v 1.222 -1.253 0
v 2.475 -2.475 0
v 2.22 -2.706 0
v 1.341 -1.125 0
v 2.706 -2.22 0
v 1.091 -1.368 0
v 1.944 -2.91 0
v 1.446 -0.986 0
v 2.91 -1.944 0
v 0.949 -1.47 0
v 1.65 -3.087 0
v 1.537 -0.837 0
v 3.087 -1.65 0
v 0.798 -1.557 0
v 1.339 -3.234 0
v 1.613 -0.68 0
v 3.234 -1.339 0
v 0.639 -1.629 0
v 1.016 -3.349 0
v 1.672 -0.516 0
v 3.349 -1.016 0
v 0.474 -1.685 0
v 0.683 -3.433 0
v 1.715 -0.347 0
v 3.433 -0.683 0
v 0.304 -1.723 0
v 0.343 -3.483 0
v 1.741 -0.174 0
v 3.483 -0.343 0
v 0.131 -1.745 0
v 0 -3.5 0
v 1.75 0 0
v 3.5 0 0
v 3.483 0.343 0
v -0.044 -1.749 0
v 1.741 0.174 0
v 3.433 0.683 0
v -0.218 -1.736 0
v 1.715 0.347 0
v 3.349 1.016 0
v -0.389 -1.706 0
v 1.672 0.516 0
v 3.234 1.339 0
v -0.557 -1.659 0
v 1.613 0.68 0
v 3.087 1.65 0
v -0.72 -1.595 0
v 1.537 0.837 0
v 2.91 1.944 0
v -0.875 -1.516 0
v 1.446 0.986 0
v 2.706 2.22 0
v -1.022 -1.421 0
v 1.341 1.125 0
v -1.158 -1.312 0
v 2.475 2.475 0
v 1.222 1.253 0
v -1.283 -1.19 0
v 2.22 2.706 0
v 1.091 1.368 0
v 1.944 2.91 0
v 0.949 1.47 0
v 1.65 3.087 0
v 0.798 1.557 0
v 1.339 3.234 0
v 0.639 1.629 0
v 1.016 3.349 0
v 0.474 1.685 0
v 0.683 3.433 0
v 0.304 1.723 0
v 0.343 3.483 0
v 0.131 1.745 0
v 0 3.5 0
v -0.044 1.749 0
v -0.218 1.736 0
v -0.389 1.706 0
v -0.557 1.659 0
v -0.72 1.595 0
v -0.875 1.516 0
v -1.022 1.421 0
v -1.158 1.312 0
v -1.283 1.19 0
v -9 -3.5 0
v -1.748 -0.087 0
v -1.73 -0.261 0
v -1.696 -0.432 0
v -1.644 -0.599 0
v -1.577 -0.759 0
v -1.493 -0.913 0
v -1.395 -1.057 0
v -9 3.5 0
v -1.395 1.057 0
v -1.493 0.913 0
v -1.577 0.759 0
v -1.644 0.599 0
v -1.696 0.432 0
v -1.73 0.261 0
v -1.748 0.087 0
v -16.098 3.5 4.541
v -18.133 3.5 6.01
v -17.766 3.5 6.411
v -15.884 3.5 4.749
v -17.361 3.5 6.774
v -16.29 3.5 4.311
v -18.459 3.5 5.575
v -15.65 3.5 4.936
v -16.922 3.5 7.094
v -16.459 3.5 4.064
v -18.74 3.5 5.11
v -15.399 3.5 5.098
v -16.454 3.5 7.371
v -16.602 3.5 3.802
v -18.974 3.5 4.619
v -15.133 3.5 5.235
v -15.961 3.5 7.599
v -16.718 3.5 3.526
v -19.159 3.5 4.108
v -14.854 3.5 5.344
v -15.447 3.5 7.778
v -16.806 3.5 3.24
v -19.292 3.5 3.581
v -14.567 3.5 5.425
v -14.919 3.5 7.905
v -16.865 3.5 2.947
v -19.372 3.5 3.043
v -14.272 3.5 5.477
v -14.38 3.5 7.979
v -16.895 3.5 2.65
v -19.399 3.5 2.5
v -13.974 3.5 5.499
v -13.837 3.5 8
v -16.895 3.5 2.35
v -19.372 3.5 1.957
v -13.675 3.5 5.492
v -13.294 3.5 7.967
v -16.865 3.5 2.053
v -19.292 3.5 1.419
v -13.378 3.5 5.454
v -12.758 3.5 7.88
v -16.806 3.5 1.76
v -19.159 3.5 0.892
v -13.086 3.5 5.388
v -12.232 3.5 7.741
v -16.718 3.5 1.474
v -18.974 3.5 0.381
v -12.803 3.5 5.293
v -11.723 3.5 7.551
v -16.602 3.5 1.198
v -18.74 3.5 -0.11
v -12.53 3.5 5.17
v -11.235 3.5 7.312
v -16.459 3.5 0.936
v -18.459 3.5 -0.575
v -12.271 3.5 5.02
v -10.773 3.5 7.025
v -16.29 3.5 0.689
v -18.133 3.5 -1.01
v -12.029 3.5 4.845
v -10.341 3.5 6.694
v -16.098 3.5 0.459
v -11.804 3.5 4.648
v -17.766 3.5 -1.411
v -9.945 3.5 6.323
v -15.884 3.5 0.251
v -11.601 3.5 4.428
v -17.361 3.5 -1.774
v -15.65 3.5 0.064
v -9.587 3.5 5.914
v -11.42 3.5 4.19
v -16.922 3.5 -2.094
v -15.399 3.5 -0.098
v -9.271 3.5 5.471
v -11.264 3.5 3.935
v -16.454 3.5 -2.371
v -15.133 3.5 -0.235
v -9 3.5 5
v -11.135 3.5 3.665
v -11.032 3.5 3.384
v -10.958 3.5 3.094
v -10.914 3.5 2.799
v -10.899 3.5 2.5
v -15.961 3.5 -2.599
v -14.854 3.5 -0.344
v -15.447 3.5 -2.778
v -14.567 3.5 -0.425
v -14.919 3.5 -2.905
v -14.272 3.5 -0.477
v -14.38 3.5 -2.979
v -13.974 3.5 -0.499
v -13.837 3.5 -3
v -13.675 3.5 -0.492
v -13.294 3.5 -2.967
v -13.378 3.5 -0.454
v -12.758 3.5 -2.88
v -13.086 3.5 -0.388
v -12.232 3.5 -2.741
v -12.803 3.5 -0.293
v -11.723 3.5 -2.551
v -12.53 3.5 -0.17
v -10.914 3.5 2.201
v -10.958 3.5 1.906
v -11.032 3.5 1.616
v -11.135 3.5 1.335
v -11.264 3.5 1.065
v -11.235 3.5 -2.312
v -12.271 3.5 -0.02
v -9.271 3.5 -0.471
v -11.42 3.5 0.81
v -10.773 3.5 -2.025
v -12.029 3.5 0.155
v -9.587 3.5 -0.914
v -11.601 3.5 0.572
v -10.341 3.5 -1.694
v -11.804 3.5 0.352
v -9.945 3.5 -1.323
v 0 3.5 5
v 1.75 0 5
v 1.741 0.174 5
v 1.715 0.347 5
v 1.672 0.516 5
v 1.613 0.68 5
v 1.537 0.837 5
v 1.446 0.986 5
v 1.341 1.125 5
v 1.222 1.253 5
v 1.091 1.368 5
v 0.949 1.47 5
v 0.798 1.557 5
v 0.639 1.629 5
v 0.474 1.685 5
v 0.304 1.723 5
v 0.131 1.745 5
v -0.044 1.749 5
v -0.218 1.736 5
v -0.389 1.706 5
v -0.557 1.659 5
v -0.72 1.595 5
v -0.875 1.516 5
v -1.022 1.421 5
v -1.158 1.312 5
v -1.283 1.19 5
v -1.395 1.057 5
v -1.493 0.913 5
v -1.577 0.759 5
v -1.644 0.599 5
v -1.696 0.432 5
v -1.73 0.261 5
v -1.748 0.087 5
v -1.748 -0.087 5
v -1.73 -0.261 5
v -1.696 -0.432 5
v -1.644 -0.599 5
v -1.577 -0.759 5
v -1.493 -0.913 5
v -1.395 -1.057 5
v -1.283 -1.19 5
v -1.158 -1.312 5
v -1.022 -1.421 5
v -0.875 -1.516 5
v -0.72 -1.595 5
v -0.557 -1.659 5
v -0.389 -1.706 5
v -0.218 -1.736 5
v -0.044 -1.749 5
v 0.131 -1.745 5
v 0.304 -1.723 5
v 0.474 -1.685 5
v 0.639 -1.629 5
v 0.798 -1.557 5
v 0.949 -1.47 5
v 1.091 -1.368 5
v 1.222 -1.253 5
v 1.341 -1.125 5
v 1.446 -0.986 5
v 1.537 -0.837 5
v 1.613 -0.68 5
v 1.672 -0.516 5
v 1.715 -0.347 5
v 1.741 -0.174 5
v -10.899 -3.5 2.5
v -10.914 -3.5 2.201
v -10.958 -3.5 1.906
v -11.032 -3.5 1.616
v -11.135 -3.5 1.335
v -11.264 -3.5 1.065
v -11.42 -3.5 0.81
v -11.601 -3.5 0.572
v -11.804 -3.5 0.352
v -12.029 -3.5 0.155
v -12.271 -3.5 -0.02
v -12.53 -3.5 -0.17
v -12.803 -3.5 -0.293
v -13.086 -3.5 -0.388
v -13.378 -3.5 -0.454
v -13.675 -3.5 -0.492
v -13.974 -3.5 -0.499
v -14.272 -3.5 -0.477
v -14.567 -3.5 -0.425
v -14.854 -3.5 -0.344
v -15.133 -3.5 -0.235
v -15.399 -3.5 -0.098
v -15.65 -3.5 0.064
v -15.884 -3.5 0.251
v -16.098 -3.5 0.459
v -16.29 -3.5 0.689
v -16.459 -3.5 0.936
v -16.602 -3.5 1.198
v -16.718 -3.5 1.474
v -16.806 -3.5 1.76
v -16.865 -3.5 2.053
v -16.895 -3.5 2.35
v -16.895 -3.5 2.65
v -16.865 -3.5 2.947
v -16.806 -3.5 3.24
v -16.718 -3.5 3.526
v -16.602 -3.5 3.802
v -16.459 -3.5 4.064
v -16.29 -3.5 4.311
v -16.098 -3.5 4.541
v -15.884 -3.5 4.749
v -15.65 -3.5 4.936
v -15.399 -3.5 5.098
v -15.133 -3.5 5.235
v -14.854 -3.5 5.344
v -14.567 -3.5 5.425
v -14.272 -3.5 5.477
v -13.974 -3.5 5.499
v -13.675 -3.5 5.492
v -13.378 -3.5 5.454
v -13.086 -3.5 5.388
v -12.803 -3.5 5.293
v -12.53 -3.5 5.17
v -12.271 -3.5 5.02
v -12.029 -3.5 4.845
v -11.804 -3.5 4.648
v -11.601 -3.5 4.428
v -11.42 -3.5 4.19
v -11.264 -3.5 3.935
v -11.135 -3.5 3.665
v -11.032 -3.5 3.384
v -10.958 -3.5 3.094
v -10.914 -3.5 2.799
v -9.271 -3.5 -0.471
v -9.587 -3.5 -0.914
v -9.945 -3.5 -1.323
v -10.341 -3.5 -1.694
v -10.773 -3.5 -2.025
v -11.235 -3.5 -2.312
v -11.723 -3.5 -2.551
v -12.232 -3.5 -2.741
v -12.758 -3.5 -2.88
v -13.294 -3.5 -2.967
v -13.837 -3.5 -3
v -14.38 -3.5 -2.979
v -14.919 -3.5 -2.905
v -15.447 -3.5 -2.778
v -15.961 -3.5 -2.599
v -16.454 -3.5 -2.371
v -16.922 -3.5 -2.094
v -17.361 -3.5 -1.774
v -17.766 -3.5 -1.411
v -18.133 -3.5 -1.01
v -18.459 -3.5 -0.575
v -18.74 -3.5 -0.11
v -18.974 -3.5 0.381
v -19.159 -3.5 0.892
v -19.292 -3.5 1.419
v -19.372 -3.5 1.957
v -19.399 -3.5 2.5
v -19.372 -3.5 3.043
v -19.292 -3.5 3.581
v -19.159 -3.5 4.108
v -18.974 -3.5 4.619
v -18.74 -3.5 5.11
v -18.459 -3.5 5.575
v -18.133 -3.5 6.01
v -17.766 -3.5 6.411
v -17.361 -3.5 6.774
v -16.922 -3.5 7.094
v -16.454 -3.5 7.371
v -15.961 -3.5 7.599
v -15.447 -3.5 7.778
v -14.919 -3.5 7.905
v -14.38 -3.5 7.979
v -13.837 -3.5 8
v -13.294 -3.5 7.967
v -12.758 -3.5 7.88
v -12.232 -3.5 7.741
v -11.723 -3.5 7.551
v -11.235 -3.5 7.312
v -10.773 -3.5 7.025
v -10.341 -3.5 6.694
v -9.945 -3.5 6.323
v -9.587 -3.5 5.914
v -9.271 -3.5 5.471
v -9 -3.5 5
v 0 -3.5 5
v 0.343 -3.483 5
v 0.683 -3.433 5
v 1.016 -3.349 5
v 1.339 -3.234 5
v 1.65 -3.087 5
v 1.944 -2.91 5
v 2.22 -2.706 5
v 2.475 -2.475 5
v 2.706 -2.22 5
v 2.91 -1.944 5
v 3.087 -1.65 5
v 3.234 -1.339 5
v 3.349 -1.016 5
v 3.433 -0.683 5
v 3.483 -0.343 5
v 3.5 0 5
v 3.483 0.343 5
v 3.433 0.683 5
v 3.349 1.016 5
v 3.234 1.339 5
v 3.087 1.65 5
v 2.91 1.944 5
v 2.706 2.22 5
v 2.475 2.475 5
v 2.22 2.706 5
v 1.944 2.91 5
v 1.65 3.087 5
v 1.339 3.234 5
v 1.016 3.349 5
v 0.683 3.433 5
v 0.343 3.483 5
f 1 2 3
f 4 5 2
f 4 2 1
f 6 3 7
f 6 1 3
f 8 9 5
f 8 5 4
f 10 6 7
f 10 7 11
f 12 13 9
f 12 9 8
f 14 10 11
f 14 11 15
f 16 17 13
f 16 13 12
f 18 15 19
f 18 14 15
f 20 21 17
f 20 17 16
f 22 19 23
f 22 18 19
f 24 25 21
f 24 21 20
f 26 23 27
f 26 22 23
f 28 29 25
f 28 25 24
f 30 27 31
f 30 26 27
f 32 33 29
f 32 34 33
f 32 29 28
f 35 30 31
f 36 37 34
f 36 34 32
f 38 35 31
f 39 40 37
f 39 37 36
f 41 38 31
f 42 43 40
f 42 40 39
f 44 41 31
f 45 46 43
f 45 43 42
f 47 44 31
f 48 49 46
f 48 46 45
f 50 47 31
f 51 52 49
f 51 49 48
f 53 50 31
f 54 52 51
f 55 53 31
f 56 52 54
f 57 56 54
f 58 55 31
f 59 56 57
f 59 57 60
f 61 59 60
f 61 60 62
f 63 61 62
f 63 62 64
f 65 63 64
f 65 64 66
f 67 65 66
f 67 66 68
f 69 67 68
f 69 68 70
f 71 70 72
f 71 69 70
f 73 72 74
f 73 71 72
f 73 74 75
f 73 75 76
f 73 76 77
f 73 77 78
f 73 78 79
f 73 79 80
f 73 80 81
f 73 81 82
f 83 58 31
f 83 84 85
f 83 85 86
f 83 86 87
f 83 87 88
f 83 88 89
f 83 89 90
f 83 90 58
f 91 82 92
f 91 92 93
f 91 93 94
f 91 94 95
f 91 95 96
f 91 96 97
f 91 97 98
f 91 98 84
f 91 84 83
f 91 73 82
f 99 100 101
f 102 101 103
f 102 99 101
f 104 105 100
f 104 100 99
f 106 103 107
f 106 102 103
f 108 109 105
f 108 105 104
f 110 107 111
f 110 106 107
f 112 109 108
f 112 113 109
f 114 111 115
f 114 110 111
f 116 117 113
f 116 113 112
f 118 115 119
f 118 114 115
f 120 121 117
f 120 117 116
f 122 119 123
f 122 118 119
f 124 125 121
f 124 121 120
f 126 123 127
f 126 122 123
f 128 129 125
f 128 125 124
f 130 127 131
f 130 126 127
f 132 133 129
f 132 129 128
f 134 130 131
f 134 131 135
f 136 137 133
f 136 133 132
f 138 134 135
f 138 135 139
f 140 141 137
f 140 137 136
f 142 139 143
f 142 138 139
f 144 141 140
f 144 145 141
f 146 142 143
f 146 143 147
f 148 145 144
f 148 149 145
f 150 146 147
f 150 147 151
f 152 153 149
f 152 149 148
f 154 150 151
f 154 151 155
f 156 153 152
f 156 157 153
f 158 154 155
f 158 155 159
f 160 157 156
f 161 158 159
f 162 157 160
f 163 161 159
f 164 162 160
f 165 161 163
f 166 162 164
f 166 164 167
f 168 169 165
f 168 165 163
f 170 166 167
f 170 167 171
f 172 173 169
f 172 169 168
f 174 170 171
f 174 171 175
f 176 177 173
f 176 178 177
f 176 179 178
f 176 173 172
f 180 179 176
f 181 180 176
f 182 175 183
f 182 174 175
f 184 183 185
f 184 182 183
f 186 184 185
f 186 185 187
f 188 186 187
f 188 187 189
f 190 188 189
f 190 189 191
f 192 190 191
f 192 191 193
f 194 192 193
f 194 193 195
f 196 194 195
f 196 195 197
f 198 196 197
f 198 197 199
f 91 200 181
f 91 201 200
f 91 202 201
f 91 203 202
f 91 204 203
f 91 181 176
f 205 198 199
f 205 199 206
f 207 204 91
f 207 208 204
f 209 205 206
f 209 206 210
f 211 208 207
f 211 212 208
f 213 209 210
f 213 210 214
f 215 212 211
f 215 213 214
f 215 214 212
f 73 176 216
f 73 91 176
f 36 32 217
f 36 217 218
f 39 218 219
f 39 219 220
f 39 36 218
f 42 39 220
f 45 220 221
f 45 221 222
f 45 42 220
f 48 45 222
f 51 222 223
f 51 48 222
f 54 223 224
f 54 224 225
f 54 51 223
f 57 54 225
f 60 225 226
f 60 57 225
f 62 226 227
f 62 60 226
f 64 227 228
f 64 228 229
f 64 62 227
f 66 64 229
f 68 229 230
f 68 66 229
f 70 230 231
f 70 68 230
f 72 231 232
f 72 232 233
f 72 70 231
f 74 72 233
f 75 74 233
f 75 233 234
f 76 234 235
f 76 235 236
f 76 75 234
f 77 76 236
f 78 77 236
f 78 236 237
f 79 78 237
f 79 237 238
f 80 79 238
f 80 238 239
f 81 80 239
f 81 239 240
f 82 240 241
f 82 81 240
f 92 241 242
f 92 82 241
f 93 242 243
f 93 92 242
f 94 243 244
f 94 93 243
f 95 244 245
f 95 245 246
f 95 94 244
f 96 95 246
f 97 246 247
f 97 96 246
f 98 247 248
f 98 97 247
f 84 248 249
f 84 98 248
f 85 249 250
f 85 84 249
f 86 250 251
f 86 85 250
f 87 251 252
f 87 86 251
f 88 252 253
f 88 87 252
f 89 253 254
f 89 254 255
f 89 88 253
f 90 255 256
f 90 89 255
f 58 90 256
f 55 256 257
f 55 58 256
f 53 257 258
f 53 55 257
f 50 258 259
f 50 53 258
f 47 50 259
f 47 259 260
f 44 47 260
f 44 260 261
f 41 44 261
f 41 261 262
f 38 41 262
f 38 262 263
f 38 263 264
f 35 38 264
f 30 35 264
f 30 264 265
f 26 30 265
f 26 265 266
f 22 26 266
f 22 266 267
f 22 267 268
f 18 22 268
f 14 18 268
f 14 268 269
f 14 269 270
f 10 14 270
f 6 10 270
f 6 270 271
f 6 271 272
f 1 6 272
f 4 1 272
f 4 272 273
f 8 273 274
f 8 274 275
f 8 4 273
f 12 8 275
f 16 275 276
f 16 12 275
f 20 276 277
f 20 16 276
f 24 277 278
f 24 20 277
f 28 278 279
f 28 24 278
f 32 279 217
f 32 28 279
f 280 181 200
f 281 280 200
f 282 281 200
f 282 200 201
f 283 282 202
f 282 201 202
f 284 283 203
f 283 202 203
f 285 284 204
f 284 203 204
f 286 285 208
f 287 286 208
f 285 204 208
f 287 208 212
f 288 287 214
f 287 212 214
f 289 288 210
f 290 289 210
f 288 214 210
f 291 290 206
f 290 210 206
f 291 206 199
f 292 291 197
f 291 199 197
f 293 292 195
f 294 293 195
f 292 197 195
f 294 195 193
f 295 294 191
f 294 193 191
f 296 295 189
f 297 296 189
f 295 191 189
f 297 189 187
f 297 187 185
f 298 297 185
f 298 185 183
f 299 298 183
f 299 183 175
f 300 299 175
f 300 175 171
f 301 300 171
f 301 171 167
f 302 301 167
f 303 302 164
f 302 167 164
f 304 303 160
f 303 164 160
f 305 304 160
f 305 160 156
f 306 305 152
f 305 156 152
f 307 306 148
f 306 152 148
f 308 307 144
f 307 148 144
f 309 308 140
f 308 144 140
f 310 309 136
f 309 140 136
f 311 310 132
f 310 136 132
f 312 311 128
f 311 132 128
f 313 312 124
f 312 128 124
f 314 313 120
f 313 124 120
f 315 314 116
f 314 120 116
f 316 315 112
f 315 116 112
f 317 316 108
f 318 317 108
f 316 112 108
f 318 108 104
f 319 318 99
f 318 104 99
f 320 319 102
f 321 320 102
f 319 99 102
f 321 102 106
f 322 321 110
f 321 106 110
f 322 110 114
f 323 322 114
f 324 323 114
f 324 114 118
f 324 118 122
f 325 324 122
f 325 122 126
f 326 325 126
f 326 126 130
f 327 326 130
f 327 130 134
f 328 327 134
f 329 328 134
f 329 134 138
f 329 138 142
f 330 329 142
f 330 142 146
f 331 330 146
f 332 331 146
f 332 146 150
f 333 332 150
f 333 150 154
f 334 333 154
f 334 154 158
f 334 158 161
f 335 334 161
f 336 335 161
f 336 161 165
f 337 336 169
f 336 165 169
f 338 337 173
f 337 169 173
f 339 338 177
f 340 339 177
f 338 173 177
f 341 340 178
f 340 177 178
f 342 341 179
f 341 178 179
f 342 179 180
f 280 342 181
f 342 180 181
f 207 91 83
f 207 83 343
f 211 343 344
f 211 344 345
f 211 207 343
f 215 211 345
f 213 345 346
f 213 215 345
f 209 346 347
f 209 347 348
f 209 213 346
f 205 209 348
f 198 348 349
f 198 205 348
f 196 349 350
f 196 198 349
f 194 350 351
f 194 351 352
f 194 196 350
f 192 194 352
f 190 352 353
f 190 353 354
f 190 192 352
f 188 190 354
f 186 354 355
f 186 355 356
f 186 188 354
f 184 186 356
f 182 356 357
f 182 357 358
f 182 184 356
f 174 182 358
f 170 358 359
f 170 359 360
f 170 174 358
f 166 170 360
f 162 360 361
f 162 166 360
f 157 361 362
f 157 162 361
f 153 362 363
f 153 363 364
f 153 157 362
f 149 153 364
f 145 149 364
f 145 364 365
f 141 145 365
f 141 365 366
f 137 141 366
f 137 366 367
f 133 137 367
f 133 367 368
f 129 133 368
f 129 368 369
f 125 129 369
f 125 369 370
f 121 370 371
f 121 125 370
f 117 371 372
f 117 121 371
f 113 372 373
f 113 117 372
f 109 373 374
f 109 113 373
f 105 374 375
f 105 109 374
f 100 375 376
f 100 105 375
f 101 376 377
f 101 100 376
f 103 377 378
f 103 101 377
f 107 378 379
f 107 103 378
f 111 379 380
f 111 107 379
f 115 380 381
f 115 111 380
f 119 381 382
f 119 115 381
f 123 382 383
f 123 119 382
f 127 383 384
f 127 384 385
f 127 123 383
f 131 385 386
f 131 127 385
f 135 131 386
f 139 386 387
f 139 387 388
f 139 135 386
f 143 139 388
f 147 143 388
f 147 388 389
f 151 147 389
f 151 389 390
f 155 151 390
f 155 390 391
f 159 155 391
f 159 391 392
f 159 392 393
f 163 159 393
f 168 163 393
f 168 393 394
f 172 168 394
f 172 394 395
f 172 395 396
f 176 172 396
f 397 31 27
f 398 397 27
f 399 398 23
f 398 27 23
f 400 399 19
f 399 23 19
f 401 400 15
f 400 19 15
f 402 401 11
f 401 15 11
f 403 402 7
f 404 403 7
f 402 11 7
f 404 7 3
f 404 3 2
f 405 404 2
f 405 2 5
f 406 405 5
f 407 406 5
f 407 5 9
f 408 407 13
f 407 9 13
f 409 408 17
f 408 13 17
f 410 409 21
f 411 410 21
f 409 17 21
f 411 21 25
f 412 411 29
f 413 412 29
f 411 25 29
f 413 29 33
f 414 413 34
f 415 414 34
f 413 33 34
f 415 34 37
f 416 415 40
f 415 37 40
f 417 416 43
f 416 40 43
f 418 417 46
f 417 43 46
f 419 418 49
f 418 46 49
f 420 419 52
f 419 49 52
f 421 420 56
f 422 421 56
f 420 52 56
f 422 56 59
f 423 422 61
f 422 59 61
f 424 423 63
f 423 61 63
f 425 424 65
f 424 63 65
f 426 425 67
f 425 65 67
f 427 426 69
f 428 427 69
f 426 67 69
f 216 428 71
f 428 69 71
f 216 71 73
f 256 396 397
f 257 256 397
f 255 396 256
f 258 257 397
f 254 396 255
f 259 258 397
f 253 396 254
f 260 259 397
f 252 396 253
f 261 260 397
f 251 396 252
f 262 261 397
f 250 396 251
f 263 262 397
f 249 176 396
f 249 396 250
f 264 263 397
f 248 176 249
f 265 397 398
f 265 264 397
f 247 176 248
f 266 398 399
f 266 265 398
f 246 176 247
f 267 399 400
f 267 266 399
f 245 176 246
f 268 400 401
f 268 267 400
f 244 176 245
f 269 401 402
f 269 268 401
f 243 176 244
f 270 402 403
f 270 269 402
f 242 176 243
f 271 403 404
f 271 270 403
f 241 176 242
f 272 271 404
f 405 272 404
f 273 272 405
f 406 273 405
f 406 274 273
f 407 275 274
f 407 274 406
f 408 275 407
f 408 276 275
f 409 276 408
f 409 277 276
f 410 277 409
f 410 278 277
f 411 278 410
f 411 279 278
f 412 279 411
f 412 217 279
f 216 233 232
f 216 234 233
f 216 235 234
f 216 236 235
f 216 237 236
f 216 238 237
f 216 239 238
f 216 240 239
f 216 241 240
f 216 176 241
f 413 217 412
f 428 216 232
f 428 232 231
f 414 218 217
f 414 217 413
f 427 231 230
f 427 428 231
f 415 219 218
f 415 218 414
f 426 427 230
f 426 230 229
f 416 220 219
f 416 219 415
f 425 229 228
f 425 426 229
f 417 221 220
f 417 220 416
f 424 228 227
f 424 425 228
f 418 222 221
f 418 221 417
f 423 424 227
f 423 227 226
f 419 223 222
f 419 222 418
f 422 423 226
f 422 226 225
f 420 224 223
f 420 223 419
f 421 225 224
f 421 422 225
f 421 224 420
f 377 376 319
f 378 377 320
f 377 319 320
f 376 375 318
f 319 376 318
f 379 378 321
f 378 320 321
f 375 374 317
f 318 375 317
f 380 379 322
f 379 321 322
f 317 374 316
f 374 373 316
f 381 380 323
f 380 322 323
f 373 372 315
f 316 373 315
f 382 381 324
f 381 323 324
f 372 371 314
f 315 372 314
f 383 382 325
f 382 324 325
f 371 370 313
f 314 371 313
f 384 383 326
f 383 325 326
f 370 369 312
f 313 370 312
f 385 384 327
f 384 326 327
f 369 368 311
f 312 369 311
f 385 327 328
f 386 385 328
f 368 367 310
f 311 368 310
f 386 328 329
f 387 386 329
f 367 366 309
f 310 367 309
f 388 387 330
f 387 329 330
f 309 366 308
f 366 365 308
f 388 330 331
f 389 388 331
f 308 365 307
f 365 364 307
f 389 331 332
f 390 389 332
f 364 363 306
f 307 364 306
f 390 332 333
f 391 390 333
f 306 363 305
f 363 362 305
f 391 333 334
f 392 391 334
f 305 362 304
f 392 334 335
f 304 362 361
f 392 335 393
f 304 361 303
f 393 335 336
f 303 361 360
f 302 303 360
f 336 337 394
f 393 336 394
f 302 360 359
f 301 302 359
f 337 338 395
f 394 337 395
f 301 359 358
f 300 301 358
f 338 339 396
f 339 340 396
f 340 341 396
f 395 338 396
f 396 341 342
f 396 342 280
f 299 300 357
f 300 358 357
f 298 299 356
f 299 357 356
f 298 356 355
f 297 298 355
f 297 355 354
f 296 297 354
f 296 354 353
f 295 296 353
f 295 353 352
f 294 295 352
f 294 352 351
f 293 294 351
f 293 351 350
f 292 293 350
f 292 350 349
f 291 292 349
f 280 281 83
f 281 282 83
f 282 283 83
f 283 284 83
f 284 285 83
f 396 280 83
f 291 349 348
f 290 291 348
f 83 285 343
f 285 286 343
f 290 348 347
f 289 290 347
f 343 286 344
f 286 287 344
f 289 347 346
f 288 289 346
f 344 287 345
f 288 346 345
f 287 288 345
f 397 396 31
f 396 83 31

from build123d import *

# Parameters (mm, degrees)
ESBO_O1_R                = 1.75
RESSALTO_EXTRUS_O1_DEPTH = 5
ESBO_O2_R                = 3
RESSALTO_EXTRUS_O2_DEPTH = 7


with BuildPart() as part:
    # Esboço1 → Ressalto-extrusão1 (new body)
    with BuildSketch(Plane.XY):
        with BuildLine():
            Line((0, 3.5), (-6, 3.5))
            Line((-6, 3.5), (-6, -3.5))
            Line((-6, -3.5), (0, -3.5))
            ThreePointArc((0, -3.5), (3.5, 0), (0, 3.5))
        make_face()
        Circle(ESBO_O1_R, mode=Mode.SUBTRACT)
    extrude(amount=RESSALTO_EXTRUS_O1_DEPTH)

    # Esboço2 → Ressalto-extrusão2 (add)
    with BuildSketch(Plane(origin=(0, 3.5, 0), x_dir=(1, 0, 0), z_dir=(0, 1, 0))):
        with BuildLine():
            Line((-6, -5), (-6, 0))
            Line((-6, 0), (-9, 0))
            ThreePointArc((-9, 0), (-19.398979486, -2.5), (-9, -5))
            Line((-9, -5), (-6, -5))
        make_face()
        with Locations((-13.898979486, -2.5)):
            Circle(ESBO_O2_R, mode=Mode.SUBTRACT)
    extrude(amount=-RESSALTO_EXTRUS_O2_DEPTH)


solid = part.part
